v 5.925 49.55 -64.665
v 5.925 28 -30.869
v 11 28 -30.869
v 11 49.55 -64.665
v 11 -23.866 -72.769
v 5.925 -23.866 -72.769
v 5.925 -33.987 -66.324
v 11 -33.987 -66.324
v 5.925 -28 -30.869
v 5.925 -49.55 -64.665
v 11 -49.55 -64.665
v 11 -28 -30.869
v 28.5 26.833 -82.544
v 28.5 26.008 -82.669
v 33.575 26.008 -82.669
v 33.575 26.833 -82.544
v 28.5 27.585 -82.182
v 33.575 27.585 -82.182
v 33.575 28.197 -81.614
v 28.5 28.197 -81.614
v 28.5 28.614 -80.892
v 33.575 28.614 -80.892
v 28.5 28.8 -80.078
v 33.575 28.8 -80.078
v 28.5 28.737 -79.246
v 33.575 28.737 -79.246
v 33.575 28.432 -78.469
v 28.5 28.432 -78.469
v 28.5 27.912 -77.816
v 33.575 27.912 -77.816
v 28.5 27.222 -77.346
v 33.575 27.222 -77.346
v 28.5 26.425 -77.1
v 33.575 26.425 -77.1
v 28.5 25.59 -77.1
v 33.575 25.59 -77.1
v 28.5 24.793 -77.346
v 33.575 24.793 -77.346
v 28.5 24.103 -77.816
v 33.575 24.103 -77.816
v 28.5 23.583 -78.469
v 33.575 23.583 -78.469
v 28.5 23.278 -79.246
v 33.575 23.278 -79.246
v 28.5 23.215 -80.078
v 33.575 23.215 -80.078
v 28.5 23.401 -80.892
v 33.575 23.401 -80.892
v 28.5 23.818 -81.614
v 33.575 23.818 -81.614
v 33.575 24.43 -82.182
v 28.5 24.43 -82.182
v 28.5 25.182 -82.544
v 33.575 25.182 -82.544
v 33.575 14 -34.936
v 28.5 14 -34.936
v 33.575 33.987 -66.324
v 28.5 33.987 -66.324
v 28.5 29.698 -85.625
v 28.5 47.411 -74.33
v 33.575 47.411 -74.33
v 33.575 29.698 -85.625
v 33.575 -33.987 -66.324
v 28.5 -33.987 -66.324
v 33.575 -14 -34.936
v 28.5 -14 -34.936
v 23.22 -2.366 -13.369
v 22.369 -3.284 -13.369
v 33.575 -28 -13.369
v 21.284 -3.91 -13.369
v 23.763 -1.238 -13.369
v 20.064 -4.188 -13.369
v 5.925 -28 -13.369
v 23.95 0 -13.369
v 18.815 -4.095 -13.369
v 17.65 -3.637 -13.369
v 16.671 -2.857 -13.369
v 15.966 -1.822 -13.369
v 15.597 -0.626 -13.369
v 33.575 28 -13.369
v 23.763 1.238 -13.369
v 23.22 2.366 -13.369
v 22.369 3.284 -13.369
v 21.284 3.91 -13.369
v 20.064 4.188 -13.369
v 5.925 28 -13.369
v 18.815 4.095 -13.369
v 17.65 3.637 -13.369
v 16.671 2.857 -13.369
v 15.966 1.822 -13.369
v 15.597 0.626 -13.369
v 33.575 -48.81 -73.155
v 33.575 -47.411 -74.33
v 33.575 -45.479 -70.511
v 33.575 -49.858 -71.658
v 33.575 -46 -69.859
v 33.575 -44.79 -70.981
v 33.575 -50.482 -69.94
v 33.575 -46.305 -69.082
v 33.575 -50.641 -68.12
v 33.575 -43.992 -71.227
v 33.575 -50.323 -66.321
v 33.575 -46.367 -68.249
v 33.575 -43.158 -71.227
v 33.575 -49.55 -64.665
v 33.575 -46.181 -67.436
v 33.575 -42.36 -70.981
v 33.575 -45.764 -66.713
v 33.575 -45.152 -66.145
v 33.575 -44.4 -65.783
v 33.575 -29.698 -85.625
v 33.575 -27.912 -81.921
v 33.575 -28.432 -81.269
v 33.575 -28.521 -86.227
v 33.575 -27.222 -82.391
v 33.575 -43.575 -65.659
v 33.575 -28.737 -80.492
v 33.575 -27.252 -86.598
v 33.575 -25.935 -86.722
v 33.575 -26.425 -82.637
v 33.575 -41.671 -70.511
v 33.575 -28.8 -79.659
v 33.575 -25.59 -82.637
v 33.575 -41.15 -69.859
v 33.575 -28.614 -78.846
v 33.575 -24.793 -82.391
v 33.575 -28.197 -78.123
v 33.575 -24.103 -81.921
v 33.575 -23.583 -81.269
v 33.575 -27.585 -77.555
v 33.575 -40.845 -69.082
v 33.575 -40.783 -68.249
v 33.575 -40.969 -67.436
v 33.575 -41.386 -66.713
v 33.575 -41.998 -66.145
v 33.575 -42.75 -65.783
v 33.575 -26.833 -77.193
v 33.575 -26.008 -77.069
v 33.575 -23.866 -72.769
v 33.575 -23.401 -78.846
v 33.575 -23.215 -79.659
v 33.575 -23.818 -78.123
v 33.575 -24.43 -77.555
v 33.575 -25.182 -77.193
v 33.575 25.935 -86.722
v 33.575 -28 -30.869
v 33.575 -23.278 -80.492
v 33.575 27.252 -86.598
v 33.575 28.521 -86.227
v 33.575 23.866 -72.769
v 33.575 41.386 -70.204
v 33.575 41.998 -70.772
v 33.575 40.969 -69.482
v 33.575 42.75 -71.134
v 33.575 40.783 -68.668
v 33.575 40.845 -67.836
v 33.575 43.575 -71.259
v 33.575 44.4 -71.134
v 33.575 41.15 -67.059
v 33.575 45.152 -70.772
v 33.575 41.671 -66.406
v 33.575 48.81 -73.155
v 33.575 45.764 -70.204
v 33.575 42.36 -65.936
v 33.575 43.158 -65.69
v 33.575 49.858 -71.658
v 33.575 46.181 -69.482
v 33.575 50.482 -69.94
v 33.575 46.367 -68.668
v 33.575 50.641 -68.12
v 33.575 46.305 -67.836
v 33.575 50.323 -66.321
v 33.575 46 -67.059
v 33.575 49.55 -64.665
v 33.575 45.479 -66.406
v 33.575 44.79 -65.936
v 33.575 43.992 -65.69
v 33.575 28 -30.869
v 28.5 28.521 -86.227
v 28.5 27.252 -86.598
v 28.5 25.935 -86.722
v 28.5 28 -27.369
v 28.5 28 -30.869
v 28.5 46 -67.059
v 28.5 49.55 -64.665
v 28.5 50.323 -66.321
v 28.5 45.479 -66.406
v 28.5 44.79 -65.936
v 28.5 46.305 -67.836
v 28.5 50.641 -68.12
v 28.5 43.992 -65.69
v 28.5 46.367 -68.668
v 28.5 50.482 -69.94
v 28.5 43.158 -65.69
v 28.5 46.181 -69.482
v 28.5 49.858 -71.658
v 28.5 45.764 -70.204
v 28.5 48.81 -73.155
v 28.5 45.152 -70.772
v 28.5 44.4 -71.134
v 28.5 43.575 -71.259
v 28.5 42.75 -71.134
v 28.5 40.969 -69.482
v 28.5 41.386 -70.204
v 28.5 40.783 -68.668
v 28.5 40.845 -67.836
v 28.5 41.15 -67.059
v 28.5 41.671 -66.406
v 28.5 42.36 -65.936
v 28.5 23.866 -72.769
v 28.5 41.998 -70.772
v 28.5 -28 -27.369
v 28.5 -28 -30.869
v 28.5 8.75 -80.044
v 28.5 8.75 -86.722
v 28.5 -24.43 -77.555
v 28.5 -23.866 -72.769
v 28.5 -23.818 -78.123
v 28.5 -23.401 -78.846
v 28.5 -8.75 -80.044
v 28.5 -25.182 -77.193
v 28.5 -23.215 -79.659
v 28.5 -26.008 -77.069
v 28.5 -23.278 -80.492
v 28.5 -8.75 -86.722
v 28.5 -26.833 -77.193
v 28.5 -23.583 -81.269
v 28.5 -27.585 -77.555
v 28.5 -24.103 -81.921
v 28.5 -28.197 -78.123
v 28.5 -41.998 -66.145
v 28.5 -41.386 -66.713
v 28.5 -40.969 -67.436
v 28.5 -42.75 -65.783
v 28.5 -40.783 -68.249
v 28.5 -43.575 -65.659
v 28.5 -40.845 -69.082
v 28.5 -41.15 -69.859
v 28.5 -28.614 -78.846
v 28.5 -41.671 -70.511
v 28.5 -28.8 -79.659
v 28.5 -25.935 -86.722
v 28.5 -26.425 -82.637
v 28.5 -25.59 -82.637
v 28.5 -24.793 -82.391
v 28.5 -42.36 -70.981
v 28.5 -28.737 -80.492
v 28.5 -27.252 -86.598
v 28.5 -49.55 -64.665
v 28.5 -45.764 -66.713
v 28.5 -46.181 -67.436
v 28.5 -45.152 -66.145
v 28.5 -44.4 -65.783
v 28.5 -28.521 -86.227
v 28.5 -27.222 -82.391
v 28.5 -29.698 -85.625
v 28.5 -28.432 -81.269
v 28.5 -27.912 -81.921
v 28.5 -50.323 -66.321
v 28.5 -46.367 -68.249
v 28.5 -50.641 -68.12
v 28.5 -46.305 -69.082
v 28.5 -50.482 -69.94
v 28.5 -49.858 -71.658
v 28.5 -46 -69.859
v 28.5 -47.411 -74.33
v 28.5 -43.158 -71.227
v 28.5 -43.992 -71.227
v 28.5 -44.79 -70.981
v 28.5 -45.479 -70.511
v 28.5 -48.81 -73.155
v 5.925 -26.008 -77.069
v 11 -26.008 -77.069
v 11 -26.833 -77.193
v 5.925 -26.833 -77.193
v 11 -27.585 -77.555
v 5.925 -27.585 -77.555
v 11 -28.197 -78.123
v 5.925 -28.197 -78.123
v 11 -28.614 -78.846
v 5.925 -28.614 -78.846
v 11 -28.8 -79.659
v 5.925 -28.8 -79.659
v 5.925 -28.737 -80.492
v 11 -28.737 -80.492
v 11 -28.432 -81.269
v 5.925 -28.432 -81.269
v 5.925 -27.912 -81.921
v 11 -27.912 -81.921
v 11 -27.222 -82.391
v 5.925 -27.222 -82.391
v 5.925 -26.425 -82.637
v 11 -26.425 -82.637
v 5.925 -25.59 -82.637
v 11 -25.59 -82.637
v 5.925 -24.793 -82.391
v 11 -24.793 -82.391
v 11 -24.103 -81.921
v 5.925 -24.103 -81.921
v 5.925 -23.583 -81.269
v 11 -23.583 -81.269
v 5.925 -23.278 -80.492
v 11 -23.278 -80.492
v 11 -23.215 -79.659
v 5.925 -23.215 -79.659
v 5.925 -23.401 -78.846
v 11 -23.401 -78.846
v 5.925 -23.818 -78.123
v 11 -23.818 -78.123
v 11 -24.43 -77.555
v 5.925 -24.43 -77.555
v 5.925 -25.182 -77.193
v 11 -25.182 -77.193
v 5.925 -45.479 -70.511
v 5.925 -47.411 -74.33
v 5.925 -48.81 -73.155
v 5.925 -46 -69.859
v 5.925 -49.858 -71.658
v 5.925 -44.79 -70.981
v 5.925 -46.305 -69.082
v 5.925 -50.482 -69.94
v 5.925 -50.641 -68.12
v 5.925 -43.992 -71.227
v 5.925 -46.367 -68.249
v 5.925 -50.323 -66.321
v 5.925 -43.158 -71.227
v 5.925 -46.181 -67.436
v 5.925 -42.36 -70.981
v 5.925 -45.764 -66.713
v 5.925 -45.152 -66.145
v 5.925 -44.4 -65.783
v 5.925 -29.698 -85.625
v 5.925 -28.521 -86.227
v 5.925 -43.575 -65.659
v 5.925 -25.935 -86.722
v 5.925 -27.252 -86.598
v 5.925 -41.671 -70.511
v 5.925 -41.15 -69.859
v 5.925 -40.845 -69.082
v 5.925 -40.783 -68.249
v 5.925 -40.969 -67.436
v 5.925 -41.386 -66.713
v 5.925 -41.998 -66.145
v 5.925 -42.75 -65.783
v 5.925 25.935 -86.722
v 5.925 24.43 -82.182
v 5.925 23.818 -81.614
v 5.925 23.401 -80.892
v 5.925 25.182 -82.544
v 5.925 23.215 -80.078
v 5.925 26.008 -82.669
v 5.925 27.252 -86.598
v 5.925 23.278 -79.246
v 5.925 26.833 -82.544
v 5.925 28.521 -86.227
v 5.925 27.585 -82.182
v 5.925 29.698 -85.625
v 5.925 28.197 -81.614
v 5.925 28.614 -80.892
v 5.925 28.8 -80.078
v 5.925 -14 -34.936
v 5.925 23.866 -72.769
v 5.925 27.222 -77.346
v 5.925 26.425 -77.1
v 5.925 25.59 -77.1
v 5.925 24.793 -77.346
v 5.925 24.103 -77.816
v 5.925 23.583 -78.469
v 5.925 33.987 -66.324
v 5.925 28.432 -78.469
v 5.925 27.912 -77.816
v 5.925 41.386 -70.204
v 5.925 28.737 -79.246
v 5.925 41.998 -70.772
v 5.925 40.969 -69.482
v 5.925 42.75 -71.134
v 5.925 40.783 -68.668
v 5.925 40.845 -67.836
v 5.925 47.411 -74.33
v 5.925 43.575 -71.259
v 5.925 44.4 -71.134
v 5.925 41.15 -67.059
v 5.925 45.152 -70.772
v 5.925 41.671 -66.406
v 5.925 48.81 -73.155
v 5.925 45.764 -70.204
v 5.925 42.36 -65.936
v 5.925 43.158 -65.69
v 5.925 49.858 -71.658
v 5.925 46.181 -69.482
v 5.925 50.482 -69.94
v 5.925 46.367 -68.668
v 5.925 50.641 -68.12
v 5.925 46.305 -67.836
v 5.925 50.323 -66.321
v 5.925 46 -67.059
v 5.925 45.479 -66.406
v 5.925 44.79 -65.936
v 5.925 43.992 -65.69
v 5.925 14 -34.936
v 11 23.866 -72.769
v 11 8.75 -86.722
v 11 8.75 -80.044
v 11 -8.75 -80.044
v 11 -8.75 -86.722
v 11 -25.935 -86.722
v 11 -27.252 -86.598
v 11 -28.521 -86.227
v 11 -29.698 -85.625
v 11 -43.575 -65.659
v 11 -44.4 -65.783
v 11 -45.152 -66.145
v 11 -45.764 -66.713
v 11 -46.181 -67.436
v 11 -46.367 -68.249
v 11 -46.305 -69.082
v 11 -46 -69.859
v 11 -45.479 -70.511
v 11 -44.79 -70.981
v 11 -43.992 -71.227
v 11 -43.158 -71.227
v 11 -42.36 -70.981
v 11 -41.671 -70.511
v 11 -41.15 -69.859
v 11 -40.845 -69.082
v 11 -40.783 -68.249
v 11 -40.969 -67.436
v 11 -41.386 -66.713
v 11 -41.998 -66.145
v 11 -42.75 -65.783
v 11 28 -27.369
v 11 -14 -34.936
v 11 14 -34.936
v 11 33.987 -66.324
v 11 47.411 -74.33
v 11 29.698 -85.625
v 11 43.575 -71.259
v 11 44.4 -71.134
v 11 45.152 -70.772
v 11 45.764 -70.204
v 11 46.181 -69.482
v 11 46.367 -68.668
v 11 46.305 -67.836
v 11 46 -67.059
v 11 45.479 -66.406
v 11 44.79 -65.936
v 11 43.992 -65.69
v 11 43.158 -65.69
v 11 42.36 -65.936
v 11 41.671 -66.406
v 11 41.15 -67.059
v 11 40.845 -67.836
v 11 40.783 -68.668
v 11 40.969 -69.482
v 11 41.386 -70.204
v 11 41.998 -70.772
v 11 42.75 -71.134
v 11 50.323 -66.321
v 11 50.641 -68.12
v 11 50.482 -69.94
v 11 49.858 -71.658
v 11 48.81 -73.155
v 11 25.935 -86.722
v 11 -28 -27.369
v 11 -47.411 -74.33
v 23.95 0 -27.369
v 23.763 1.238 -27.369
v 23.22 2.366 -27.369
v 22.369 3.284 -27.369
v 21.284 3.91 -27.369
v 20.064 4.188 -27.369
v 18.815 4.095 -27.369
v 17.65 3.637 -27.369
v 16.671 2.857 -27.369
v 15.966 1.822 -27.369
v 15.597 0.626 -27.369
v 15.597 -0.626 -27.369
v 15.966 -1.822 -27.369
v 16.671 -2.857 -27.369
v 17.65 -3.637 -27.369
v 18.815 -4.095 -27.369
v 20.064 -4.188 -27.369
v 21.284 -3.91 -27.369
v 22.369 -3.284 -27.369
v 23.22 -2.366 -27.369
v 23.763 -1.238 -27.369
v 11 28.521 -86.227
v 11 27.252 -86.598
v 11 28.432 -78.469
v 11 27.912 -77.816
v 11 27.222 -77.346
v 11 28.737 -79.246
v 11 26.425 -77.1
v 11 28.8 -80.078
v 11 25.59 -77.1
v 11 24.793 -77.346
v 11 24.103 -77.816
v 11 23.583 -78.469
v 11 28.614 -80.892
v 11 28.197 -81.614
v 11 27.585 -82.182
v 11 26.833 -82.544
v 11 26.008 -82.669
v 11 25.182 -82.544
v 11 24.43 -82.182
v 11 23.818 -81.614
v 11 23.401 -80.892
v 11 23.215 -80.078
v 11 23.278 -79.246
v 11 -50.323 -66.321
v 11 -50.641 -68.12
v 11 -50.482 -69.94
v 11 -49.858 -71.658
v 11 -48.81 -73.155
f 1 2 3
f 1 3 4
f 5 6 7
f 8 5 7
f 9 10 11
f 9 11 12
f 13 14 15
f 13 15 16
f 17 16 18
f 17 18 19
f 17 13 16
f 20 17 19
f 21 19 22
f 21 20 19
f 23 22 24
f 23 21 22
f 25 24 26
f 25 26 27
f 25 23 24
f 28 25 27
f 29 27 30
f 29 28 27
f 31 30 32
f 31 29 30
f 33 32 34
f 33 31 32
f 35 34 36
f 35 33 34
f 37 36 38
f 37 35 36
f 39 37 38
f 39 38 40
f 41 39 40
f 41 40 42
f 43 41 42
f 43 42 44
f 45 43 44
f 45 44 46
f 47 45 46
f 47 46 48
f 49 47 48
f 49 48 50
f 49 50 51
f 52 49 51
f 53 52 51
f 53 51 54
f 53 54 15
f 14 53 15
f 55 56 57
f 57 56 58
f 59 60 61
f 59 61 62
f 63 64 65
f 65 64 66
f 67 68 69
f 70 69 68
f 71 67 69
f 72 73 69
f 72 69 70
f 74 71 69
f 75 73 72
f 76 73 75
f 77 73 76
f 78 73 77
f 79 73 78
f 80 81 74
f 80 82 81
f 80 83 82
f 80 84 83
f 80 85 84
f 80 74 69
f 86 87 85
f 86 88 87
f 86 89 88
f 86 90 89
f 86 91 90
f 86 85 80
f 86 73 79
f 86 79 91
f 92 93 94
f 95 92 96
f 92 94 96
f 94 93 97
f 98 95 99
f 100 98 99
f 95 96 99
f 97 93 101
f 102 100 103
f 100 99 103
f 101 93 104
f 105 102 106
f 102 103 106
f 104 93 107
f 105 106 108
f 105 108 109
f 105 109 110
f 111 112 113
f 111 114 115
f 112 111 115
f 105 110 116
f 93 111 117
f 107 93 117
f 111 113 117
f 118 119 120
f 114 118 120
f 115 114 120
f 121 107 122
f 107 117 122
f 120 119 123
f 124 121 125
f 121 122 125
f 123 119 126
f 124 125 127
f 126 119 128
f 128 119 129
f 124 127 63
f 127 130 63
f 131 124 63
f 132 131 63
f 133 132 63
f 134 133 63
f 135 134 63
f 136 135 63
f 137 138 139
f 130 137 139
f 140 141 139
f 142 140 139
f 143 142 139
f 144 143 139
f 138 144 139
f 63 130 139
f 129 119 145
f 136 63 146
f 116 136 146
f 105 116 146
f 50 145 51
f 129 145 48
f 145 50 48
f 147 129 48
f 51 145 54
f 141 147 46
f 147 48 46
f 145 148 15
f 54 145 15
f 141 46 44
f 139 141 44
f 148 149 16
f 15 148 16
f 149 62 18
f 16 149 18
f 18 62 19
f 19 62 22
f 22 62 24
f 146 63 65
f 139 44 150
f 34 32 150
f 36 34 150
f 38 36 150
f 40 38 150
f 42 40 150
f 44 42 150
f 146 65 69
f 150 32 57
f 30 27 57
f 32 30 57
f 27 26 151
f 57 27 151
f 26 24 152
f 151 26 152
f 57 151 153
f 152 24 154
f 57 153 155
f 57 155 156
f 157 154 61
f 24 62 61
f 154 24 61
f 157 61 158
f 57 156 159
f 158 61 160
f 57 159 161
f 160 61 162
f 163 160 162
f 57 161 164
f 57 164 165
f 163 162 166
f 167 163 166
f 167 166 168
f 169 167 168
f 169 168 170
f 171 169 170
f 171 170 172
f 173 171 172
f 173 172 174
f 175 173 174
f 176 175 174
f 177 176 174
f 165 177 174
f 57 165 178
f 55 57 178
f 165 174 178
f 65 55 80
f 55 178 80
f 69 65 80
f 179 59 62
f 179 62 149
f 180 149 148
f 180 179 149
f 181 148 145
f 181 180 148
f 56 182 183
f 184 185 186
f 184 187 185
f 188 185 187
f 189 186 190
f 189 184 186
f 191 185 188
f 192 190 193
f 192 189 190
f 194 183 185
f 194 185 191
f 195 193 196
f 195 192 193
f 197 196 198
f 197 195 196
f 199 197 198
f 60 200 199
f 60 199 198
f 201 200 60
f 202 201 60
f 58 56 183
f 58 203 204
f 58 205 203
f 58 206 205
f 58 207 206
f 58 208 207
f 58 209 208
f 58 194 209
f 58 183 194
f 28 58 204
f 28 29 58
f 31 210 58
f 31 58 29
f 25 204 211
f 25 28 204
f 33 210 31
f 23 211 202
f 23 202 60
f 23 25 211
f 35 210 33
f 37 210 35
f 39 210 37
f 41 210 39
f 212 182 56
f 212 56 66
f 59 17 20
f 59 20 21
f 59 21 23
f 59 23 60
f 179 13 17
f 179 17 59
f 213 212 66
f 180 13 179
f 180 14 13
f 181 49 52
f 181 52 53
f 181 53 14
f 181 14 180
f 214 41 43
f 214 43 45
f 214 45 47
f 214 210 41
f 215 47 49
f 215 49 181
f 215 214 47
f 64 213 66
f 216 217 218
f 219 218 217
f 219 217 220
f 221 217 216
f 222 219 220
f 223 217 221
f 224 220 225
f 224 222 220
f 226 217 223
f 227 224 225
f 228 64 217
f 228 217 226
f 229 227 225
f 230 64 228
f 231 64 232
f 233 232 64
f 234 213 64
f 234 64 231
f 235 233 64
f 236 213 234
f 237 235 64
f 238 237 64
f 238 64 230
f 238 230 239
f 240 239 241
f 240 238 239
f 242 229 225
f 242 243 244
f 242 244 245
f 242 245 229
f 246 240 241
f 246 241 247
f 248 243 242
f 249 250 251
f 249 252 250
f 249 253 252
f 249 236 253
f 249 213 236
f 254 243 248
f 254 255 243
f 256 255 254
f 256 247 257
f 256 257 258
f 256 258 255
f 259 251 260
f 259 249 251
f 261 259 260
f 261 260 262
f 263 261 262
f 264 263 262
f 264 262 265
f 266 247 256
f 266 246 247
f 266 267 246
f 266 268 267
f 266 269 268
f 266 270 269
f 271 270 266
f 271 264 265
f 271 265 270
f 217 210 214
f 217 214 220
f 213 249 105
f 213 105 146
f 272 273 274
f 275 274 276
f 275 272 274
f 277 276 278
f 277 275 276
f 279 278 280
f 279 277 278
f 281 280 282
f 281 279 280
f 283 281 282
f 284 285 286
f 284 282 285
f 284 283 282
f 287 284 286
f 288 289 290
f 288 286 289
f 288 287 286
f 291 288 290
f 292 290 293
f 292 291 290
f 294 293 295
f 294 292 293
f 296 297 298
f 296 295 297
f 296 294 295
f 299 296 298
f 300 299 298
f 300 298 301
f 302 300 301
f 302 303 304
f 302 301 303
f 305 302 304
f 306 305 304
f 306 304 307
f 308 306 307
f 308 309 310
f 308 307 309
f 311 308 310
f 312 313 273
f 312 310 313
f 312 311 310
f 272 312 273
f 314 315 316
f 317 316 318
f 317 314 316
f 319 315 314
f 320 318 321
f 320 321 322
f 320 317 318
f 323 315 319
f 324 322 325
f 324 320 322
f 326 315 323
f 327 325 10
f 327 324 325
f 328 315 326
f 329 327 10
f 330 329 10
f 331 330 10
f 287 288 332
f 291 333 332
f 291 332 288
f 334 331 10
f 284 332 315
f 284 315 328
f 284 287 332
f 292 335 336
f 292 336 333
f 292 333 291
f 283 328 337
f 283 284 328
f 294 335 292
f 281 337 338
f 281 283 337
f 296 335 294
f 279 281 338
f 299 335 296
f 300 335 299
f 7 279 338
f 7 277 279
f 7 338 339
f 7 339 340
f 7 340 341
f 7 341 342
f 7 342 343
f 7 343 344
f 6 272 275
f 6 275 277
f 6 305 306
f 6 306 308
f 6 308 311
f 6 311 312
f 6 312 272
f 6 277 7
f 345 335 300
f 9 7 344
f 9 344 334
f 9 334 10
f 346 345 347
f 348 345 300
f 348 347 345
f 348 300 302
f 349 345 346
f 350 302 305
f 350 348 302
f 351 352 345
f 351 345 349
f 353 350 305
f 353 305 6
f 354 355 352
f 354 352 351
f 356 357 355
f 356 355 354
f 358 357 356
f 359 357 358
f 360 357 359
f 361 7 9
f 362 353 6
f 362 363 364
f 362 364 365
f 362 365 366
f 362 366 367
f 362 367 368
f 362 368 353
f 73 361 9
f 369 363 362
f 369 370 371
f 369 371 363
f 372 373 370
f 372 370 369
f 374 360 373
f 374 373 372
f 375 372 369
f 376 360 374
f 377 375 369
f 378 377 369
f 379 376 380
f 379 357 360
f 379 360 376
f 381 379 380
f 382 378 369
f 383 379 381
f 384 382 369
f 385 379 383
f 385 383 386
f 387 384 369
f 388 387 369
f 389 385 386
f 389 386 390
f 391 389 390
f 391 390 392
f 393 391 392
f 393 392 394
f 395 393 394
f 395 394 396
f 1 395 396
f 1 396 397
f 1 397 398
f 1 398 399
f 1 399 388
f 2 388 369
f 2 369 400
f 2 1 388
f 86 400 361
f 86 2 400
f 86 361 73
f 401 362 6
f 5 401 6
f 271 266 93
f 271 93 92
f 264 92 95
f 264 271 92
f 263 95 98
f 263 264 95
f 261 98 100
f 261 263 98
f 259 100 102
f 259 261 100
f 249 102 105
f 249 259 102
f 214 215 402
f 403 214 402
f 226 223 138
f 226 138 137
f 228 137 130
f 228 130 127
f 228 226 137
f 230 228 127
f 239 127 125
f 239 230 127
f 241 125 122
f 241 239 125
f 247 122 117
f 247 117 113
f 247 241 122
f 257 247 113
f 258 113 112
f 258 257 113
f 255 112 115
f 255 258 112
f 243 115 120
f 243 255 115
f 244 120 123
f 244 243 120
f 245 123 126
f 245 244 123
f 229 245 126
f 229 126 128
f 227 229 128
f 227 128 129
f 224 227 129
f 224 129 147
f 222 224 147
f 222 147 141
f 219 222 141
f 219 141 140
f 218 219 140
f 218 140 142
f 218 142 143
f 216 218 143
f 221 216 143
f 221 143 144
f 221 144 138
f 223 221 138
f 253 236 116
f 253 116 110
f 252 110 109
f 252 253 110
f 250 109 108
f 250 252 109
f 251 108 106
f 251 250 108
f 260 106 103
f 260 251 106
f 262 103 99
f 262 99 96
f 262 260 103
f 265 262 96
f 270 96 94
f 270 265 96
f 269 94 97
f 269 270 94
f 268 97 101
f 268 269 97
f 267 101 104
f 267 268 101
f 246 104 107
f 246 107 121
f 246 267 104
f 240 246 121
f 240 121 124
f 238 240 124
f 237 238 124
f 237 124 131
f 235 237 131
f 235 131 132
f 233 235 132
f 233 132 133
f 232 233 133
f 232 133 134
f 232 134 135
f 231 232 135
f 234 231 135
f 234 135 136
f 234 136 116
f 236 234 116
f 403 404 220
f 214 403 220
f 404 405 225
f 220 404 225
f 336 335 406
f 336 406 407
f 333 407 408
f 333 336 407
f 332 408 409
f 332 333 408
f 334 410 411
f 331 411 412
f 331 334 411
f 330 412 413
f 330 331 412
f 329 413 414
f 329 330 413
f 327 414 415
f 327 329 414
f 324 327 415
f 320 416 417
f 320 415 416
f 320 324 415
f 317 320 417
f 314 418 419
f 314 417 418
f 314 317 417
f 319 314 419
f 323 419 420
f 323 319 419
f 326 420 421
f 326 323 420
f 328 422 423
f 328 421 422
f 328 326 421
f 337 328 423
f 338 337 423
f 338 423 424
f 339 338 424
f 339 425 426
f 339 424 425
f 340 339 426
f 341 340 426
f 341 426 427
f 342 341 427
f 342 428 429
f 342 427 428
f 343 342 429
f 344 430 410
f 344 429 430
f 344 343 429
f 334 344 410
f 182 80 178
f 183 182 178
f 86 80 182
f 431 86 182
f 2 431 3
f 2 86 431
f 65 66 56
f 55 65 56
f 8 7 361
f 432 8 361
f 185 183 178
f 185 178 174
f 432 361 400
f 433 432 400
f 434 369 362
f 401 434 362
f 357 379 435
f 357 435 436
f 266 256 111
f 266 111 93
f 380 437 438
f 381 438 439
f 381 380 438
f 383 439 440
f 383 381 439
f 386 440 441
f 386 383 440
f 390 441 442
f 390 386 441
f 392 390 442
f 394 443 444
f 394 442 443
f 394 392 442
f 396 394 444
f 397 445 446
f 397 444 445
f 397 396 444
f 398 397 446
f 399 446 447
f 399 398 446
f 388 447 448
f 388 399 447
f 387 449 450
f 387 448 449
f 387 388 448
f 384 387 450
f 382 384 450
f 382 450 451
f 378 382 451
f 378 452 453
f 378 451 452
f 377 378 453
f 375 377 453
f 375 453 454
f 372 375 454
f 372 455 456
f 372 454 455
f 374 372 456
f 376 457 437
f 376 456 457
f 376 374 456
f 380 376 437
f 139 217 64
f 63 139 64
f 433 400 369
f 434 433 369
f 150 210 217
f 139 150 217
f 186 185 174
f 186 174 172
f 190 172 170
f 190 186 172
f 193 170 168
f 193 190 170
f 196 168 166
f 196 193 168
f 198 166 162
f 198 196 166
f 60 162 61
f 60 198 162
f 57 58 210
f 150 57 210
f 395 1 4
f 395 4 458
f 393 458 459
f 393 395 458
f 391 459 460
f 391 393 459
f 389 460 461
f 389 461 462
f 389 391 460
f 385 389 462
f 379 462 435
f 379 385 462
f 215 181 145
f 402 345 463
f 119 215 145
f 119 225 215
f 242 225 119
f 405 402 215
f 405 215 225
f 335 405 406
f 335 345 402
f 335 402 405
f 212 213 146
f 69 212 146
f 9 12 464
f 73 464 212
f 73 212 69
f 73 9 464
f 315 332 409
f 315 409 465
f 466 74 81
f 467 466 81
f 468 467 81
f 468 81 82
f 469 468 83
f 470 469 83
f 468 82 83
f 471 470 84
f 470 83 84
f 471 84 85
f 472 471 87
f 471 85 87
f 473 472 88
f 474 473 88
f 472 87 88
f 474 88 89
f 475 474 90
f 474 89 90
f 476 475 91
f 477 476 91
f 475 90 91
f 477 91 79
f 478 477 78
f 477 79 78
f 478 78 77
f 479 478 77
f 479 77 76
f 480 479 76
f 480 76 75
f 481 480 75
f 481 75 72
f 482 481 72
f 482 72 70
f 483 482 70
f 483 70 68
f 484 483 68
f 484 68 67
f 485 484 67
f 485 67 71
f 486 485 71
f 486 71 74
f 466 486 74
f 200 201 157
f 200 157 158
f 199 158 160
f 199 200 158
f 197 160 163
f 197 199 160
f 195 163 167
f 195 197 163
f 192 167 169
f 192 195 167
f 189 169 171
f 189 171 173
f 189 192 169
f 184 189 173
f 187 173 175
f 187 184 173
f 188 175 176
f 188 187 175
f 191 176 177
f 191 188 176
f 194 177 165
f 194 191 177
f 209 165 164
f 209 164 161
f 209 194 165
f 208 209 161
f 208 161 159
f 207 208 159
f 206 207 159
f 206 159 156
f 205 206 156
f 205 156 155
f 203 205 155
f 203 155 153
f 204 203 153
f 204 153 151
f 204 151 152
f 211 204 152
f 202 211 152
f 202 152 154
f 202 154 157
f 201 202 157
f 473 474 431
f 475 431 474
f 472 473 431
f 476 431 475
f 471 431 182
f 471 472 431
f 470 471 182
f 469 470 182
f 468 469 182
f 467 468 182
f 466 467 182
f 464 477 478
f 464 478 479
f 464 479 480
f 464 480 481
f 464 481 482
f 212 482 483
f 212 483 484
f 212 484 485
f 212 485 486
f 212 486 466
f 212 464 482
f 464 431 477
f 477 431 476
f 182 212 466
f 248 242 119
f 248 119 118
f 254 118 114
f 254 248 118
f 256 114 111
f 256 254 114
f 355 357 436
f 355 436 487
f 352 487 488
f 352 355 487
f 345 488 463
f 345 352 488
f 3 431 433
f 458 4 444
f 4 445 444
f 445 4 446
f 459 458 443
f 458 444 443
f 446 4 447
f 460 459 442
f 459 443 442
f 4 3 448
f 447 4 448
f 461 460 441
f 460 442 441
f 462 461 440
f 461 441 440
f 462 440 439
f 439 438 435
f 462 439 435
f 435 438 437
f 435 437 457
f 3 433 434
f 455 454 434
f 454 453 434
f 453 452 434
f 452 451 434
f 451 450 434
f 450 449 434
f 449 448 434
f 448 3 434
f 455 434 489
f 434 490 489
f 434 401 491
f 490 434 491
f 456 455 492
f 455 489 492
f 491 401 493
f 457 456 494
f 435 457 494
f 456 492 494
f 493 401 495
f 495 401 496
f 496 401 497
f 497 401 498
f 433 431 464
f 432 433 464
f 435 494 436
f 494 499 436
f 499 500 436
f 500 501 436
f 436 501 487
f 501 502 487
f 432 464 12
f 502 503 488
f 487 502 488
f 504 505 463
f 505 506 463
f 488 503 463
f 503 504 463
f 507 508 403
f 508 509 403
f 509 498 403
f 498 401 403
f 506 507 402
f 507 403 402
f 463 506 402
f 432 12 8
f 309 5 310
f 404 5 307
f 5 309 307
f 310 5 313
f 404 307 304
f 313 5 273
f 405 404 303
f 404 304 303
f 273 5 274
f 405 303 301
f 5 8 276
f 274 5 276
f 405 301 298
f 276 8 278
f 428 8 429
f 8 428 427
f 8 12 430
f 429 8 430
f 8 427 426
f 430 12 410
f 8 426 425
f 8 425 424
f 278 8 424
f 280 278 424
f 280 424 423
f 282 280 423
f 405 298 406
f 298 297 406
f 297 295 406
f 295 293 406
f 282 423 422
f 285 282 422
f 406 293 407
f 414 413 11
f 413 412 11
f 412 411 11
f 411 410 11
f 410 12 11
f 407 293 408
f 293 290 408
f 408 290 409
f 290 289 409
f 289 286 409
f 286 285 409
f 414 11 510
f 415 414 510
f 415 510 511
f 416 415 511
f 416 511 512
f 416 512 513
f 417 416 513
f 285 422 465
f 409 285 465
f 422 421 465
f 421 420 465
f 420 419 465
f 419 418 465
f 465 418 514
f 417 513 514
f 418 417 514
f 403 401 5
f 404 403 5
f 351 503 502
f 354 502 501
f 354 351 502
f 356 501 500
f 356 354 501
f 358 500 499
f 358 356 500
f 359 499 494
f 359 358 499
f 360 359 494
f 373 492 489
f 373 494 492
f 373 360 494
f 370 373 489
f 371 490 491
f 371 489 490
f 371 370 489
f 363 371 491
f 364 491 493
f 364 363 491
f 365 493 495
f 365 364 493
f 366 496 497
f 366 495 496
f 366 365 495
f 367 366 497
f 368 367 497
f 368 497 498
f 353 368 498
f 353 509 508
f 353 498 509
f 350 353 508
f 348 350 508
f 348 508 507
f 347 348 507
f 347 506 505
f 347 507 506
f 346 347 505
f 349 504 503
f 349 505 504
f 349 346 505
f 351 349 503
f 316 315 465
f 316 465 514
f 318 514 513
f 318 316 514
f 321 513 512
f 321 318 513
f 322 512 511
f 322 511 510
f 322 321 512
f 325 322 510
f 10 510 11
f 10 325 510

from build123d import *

# Parameters (mm, degrees)
SKETCH1_R               = 4
BOSS_EXTRUDE1_DEPTH     = 39.5
CUT_EXTRUDE1_DEPTH      = 105.5
CUT_EXTRUDE1_DEPTH_BACK = 117.5
SKETCH2_W               = 25
SKETCH2_H               = 75.25
CUT_EXTRUDE2_DEPTH      = 43.5
SKETCH4_R               = 6
CUT_EXTRUDE3_DEPTH      = 41
SCALE1_SCALE            = 0.7


with BuildPart() as part:
    # Sketch1 → Boss-Extrude1 (new body)
    with BuildSketch(Plane(origin=(0, 0, 0), x_dir=(0, 0, -1), z_dir=(1, 0, 0))):
        with BuildLine():
            Line((0, -40), (0, 40))
            Line((0, 40), (25, 40))
            Line((25, 40), (73.280107592, 70.785366831))
            ThreePointArc((73.280107592, 70.785366831), (80.81695996, 72.117470486), (87.088258906, 67.730050596))
            Line((87.088258906, 67.730050596), (103.222887942, 42.426417539))
            ThreePointArc((103.222887942, 42.426417539), (104.391084837, 39.850237691), (104.791154167, 37.05))
            Line((104.791154167, 37.05), (104.791154167, -37.05))
            ThreePointArc((104.791154167, -37.05), (104.391084837, -39.850237691), (103.222887942, -42.426417539))
            Line((103.222887942, -42.426417539), (87.088258906, -67.730050596))
            ThreePointArc((87.088258906, -67.730050596), (80.81695996, -72.117470486), (73.280107592, -70.785366831))
            Line((73.280107592, -70.785366831), (25, -40))
            Line((25, -40), (0, -40))
        make_face()
        with Locations((78.7, 62.25)):
            Circle(SKETCH1_R, mode=Mode.SUBTRACT)
        with Locations((95, 37.153633057)):
            Circle(SKETCH1_R, mode=Mode.SUBTRACT)
        with Locations(Location((95, -37.153633057, 0), (0, 0, 180))):
            Circle(SKETCH1_R, mode=Mode.SUBTRACT)
        with Locations(Location((78.7, -62.25, 0), (0, 0, 180))):
            Circle(SKETCH1_R, mode=Mode.SUBTRACT)
        Polygon((30.81, -20), (30.81, 20), (75.651092334, 48.552793879), (84.857166207, 34.095), (84.857166207, -34.095), (75.651092334, -48.552793879), align=None, mode=Mode.SUBTRACT)
    extrude(amount=BOSS_EXTRUDE1_DEPTH)

    # Sketch2 → Cut-Extrude1 (cut, two sides: drawn at the far end of the back side and taken through both)
    with BuildSketch(Plane(origin=(0, 0, 0), x_dir=(1, 0, 0), z_dir=(0, 1, 0)).offset(-CUT_EXTRUDE1_DEPTH_BACK)):
        with Locations((19.75, 57.625)):
            Rectangle(SKETCH2_W, SKETCH2_H)
    extrude(amount=CUT_EXTRUDE1_DEPTH + CUT_EXTRUDE1_DEPTH_BACK, mode=Mode.SUBTRACT)

    # Sketch3 → Cut-Extrude2 (cut)
    with BuildSketch(Plane(origin=(0, 0, -104.791154167), x_dir=(-1, 0, 0), z_dir=(0, 0, -1))):
        Polygon((-7.25, -37.05), (-7.25, -12.5), (-32.25, -12.5), (-32.25, -37.05), (-32.25, -54.930146657), (-7.25, -54.930146657), align=None)
        Polygon((-32.25, 37.05), (-32.25, 12.5), (-7.25, 12.5), (-7.25, 37.05), (-7.25, 54.930146657), (-32.25, 54.930146657), align=None)
    extrude(amount=-CUT_EXTRUDE2_DEPTH, mode=Mode.SUBTRACT)

    # Sketch4 → Cut-Extrude3 (cut)
    with BuildSketch(Plane.XY):
        with Locations((19.75, 0)):
            Circle(SKETCH4_R)
    extrude(amount=-CUT_EXTRUDE3_DEPTH, mode=Mode.SUBTRACT)


with BuildPart() as part_1:
    # Scale1: scaled about (19.75, 0, -44.562080974)
    add(part.part.scale(SCALE1_SCALE).moved(Location((5.925, 0, -13.368624292))))


solid = part_1.part
